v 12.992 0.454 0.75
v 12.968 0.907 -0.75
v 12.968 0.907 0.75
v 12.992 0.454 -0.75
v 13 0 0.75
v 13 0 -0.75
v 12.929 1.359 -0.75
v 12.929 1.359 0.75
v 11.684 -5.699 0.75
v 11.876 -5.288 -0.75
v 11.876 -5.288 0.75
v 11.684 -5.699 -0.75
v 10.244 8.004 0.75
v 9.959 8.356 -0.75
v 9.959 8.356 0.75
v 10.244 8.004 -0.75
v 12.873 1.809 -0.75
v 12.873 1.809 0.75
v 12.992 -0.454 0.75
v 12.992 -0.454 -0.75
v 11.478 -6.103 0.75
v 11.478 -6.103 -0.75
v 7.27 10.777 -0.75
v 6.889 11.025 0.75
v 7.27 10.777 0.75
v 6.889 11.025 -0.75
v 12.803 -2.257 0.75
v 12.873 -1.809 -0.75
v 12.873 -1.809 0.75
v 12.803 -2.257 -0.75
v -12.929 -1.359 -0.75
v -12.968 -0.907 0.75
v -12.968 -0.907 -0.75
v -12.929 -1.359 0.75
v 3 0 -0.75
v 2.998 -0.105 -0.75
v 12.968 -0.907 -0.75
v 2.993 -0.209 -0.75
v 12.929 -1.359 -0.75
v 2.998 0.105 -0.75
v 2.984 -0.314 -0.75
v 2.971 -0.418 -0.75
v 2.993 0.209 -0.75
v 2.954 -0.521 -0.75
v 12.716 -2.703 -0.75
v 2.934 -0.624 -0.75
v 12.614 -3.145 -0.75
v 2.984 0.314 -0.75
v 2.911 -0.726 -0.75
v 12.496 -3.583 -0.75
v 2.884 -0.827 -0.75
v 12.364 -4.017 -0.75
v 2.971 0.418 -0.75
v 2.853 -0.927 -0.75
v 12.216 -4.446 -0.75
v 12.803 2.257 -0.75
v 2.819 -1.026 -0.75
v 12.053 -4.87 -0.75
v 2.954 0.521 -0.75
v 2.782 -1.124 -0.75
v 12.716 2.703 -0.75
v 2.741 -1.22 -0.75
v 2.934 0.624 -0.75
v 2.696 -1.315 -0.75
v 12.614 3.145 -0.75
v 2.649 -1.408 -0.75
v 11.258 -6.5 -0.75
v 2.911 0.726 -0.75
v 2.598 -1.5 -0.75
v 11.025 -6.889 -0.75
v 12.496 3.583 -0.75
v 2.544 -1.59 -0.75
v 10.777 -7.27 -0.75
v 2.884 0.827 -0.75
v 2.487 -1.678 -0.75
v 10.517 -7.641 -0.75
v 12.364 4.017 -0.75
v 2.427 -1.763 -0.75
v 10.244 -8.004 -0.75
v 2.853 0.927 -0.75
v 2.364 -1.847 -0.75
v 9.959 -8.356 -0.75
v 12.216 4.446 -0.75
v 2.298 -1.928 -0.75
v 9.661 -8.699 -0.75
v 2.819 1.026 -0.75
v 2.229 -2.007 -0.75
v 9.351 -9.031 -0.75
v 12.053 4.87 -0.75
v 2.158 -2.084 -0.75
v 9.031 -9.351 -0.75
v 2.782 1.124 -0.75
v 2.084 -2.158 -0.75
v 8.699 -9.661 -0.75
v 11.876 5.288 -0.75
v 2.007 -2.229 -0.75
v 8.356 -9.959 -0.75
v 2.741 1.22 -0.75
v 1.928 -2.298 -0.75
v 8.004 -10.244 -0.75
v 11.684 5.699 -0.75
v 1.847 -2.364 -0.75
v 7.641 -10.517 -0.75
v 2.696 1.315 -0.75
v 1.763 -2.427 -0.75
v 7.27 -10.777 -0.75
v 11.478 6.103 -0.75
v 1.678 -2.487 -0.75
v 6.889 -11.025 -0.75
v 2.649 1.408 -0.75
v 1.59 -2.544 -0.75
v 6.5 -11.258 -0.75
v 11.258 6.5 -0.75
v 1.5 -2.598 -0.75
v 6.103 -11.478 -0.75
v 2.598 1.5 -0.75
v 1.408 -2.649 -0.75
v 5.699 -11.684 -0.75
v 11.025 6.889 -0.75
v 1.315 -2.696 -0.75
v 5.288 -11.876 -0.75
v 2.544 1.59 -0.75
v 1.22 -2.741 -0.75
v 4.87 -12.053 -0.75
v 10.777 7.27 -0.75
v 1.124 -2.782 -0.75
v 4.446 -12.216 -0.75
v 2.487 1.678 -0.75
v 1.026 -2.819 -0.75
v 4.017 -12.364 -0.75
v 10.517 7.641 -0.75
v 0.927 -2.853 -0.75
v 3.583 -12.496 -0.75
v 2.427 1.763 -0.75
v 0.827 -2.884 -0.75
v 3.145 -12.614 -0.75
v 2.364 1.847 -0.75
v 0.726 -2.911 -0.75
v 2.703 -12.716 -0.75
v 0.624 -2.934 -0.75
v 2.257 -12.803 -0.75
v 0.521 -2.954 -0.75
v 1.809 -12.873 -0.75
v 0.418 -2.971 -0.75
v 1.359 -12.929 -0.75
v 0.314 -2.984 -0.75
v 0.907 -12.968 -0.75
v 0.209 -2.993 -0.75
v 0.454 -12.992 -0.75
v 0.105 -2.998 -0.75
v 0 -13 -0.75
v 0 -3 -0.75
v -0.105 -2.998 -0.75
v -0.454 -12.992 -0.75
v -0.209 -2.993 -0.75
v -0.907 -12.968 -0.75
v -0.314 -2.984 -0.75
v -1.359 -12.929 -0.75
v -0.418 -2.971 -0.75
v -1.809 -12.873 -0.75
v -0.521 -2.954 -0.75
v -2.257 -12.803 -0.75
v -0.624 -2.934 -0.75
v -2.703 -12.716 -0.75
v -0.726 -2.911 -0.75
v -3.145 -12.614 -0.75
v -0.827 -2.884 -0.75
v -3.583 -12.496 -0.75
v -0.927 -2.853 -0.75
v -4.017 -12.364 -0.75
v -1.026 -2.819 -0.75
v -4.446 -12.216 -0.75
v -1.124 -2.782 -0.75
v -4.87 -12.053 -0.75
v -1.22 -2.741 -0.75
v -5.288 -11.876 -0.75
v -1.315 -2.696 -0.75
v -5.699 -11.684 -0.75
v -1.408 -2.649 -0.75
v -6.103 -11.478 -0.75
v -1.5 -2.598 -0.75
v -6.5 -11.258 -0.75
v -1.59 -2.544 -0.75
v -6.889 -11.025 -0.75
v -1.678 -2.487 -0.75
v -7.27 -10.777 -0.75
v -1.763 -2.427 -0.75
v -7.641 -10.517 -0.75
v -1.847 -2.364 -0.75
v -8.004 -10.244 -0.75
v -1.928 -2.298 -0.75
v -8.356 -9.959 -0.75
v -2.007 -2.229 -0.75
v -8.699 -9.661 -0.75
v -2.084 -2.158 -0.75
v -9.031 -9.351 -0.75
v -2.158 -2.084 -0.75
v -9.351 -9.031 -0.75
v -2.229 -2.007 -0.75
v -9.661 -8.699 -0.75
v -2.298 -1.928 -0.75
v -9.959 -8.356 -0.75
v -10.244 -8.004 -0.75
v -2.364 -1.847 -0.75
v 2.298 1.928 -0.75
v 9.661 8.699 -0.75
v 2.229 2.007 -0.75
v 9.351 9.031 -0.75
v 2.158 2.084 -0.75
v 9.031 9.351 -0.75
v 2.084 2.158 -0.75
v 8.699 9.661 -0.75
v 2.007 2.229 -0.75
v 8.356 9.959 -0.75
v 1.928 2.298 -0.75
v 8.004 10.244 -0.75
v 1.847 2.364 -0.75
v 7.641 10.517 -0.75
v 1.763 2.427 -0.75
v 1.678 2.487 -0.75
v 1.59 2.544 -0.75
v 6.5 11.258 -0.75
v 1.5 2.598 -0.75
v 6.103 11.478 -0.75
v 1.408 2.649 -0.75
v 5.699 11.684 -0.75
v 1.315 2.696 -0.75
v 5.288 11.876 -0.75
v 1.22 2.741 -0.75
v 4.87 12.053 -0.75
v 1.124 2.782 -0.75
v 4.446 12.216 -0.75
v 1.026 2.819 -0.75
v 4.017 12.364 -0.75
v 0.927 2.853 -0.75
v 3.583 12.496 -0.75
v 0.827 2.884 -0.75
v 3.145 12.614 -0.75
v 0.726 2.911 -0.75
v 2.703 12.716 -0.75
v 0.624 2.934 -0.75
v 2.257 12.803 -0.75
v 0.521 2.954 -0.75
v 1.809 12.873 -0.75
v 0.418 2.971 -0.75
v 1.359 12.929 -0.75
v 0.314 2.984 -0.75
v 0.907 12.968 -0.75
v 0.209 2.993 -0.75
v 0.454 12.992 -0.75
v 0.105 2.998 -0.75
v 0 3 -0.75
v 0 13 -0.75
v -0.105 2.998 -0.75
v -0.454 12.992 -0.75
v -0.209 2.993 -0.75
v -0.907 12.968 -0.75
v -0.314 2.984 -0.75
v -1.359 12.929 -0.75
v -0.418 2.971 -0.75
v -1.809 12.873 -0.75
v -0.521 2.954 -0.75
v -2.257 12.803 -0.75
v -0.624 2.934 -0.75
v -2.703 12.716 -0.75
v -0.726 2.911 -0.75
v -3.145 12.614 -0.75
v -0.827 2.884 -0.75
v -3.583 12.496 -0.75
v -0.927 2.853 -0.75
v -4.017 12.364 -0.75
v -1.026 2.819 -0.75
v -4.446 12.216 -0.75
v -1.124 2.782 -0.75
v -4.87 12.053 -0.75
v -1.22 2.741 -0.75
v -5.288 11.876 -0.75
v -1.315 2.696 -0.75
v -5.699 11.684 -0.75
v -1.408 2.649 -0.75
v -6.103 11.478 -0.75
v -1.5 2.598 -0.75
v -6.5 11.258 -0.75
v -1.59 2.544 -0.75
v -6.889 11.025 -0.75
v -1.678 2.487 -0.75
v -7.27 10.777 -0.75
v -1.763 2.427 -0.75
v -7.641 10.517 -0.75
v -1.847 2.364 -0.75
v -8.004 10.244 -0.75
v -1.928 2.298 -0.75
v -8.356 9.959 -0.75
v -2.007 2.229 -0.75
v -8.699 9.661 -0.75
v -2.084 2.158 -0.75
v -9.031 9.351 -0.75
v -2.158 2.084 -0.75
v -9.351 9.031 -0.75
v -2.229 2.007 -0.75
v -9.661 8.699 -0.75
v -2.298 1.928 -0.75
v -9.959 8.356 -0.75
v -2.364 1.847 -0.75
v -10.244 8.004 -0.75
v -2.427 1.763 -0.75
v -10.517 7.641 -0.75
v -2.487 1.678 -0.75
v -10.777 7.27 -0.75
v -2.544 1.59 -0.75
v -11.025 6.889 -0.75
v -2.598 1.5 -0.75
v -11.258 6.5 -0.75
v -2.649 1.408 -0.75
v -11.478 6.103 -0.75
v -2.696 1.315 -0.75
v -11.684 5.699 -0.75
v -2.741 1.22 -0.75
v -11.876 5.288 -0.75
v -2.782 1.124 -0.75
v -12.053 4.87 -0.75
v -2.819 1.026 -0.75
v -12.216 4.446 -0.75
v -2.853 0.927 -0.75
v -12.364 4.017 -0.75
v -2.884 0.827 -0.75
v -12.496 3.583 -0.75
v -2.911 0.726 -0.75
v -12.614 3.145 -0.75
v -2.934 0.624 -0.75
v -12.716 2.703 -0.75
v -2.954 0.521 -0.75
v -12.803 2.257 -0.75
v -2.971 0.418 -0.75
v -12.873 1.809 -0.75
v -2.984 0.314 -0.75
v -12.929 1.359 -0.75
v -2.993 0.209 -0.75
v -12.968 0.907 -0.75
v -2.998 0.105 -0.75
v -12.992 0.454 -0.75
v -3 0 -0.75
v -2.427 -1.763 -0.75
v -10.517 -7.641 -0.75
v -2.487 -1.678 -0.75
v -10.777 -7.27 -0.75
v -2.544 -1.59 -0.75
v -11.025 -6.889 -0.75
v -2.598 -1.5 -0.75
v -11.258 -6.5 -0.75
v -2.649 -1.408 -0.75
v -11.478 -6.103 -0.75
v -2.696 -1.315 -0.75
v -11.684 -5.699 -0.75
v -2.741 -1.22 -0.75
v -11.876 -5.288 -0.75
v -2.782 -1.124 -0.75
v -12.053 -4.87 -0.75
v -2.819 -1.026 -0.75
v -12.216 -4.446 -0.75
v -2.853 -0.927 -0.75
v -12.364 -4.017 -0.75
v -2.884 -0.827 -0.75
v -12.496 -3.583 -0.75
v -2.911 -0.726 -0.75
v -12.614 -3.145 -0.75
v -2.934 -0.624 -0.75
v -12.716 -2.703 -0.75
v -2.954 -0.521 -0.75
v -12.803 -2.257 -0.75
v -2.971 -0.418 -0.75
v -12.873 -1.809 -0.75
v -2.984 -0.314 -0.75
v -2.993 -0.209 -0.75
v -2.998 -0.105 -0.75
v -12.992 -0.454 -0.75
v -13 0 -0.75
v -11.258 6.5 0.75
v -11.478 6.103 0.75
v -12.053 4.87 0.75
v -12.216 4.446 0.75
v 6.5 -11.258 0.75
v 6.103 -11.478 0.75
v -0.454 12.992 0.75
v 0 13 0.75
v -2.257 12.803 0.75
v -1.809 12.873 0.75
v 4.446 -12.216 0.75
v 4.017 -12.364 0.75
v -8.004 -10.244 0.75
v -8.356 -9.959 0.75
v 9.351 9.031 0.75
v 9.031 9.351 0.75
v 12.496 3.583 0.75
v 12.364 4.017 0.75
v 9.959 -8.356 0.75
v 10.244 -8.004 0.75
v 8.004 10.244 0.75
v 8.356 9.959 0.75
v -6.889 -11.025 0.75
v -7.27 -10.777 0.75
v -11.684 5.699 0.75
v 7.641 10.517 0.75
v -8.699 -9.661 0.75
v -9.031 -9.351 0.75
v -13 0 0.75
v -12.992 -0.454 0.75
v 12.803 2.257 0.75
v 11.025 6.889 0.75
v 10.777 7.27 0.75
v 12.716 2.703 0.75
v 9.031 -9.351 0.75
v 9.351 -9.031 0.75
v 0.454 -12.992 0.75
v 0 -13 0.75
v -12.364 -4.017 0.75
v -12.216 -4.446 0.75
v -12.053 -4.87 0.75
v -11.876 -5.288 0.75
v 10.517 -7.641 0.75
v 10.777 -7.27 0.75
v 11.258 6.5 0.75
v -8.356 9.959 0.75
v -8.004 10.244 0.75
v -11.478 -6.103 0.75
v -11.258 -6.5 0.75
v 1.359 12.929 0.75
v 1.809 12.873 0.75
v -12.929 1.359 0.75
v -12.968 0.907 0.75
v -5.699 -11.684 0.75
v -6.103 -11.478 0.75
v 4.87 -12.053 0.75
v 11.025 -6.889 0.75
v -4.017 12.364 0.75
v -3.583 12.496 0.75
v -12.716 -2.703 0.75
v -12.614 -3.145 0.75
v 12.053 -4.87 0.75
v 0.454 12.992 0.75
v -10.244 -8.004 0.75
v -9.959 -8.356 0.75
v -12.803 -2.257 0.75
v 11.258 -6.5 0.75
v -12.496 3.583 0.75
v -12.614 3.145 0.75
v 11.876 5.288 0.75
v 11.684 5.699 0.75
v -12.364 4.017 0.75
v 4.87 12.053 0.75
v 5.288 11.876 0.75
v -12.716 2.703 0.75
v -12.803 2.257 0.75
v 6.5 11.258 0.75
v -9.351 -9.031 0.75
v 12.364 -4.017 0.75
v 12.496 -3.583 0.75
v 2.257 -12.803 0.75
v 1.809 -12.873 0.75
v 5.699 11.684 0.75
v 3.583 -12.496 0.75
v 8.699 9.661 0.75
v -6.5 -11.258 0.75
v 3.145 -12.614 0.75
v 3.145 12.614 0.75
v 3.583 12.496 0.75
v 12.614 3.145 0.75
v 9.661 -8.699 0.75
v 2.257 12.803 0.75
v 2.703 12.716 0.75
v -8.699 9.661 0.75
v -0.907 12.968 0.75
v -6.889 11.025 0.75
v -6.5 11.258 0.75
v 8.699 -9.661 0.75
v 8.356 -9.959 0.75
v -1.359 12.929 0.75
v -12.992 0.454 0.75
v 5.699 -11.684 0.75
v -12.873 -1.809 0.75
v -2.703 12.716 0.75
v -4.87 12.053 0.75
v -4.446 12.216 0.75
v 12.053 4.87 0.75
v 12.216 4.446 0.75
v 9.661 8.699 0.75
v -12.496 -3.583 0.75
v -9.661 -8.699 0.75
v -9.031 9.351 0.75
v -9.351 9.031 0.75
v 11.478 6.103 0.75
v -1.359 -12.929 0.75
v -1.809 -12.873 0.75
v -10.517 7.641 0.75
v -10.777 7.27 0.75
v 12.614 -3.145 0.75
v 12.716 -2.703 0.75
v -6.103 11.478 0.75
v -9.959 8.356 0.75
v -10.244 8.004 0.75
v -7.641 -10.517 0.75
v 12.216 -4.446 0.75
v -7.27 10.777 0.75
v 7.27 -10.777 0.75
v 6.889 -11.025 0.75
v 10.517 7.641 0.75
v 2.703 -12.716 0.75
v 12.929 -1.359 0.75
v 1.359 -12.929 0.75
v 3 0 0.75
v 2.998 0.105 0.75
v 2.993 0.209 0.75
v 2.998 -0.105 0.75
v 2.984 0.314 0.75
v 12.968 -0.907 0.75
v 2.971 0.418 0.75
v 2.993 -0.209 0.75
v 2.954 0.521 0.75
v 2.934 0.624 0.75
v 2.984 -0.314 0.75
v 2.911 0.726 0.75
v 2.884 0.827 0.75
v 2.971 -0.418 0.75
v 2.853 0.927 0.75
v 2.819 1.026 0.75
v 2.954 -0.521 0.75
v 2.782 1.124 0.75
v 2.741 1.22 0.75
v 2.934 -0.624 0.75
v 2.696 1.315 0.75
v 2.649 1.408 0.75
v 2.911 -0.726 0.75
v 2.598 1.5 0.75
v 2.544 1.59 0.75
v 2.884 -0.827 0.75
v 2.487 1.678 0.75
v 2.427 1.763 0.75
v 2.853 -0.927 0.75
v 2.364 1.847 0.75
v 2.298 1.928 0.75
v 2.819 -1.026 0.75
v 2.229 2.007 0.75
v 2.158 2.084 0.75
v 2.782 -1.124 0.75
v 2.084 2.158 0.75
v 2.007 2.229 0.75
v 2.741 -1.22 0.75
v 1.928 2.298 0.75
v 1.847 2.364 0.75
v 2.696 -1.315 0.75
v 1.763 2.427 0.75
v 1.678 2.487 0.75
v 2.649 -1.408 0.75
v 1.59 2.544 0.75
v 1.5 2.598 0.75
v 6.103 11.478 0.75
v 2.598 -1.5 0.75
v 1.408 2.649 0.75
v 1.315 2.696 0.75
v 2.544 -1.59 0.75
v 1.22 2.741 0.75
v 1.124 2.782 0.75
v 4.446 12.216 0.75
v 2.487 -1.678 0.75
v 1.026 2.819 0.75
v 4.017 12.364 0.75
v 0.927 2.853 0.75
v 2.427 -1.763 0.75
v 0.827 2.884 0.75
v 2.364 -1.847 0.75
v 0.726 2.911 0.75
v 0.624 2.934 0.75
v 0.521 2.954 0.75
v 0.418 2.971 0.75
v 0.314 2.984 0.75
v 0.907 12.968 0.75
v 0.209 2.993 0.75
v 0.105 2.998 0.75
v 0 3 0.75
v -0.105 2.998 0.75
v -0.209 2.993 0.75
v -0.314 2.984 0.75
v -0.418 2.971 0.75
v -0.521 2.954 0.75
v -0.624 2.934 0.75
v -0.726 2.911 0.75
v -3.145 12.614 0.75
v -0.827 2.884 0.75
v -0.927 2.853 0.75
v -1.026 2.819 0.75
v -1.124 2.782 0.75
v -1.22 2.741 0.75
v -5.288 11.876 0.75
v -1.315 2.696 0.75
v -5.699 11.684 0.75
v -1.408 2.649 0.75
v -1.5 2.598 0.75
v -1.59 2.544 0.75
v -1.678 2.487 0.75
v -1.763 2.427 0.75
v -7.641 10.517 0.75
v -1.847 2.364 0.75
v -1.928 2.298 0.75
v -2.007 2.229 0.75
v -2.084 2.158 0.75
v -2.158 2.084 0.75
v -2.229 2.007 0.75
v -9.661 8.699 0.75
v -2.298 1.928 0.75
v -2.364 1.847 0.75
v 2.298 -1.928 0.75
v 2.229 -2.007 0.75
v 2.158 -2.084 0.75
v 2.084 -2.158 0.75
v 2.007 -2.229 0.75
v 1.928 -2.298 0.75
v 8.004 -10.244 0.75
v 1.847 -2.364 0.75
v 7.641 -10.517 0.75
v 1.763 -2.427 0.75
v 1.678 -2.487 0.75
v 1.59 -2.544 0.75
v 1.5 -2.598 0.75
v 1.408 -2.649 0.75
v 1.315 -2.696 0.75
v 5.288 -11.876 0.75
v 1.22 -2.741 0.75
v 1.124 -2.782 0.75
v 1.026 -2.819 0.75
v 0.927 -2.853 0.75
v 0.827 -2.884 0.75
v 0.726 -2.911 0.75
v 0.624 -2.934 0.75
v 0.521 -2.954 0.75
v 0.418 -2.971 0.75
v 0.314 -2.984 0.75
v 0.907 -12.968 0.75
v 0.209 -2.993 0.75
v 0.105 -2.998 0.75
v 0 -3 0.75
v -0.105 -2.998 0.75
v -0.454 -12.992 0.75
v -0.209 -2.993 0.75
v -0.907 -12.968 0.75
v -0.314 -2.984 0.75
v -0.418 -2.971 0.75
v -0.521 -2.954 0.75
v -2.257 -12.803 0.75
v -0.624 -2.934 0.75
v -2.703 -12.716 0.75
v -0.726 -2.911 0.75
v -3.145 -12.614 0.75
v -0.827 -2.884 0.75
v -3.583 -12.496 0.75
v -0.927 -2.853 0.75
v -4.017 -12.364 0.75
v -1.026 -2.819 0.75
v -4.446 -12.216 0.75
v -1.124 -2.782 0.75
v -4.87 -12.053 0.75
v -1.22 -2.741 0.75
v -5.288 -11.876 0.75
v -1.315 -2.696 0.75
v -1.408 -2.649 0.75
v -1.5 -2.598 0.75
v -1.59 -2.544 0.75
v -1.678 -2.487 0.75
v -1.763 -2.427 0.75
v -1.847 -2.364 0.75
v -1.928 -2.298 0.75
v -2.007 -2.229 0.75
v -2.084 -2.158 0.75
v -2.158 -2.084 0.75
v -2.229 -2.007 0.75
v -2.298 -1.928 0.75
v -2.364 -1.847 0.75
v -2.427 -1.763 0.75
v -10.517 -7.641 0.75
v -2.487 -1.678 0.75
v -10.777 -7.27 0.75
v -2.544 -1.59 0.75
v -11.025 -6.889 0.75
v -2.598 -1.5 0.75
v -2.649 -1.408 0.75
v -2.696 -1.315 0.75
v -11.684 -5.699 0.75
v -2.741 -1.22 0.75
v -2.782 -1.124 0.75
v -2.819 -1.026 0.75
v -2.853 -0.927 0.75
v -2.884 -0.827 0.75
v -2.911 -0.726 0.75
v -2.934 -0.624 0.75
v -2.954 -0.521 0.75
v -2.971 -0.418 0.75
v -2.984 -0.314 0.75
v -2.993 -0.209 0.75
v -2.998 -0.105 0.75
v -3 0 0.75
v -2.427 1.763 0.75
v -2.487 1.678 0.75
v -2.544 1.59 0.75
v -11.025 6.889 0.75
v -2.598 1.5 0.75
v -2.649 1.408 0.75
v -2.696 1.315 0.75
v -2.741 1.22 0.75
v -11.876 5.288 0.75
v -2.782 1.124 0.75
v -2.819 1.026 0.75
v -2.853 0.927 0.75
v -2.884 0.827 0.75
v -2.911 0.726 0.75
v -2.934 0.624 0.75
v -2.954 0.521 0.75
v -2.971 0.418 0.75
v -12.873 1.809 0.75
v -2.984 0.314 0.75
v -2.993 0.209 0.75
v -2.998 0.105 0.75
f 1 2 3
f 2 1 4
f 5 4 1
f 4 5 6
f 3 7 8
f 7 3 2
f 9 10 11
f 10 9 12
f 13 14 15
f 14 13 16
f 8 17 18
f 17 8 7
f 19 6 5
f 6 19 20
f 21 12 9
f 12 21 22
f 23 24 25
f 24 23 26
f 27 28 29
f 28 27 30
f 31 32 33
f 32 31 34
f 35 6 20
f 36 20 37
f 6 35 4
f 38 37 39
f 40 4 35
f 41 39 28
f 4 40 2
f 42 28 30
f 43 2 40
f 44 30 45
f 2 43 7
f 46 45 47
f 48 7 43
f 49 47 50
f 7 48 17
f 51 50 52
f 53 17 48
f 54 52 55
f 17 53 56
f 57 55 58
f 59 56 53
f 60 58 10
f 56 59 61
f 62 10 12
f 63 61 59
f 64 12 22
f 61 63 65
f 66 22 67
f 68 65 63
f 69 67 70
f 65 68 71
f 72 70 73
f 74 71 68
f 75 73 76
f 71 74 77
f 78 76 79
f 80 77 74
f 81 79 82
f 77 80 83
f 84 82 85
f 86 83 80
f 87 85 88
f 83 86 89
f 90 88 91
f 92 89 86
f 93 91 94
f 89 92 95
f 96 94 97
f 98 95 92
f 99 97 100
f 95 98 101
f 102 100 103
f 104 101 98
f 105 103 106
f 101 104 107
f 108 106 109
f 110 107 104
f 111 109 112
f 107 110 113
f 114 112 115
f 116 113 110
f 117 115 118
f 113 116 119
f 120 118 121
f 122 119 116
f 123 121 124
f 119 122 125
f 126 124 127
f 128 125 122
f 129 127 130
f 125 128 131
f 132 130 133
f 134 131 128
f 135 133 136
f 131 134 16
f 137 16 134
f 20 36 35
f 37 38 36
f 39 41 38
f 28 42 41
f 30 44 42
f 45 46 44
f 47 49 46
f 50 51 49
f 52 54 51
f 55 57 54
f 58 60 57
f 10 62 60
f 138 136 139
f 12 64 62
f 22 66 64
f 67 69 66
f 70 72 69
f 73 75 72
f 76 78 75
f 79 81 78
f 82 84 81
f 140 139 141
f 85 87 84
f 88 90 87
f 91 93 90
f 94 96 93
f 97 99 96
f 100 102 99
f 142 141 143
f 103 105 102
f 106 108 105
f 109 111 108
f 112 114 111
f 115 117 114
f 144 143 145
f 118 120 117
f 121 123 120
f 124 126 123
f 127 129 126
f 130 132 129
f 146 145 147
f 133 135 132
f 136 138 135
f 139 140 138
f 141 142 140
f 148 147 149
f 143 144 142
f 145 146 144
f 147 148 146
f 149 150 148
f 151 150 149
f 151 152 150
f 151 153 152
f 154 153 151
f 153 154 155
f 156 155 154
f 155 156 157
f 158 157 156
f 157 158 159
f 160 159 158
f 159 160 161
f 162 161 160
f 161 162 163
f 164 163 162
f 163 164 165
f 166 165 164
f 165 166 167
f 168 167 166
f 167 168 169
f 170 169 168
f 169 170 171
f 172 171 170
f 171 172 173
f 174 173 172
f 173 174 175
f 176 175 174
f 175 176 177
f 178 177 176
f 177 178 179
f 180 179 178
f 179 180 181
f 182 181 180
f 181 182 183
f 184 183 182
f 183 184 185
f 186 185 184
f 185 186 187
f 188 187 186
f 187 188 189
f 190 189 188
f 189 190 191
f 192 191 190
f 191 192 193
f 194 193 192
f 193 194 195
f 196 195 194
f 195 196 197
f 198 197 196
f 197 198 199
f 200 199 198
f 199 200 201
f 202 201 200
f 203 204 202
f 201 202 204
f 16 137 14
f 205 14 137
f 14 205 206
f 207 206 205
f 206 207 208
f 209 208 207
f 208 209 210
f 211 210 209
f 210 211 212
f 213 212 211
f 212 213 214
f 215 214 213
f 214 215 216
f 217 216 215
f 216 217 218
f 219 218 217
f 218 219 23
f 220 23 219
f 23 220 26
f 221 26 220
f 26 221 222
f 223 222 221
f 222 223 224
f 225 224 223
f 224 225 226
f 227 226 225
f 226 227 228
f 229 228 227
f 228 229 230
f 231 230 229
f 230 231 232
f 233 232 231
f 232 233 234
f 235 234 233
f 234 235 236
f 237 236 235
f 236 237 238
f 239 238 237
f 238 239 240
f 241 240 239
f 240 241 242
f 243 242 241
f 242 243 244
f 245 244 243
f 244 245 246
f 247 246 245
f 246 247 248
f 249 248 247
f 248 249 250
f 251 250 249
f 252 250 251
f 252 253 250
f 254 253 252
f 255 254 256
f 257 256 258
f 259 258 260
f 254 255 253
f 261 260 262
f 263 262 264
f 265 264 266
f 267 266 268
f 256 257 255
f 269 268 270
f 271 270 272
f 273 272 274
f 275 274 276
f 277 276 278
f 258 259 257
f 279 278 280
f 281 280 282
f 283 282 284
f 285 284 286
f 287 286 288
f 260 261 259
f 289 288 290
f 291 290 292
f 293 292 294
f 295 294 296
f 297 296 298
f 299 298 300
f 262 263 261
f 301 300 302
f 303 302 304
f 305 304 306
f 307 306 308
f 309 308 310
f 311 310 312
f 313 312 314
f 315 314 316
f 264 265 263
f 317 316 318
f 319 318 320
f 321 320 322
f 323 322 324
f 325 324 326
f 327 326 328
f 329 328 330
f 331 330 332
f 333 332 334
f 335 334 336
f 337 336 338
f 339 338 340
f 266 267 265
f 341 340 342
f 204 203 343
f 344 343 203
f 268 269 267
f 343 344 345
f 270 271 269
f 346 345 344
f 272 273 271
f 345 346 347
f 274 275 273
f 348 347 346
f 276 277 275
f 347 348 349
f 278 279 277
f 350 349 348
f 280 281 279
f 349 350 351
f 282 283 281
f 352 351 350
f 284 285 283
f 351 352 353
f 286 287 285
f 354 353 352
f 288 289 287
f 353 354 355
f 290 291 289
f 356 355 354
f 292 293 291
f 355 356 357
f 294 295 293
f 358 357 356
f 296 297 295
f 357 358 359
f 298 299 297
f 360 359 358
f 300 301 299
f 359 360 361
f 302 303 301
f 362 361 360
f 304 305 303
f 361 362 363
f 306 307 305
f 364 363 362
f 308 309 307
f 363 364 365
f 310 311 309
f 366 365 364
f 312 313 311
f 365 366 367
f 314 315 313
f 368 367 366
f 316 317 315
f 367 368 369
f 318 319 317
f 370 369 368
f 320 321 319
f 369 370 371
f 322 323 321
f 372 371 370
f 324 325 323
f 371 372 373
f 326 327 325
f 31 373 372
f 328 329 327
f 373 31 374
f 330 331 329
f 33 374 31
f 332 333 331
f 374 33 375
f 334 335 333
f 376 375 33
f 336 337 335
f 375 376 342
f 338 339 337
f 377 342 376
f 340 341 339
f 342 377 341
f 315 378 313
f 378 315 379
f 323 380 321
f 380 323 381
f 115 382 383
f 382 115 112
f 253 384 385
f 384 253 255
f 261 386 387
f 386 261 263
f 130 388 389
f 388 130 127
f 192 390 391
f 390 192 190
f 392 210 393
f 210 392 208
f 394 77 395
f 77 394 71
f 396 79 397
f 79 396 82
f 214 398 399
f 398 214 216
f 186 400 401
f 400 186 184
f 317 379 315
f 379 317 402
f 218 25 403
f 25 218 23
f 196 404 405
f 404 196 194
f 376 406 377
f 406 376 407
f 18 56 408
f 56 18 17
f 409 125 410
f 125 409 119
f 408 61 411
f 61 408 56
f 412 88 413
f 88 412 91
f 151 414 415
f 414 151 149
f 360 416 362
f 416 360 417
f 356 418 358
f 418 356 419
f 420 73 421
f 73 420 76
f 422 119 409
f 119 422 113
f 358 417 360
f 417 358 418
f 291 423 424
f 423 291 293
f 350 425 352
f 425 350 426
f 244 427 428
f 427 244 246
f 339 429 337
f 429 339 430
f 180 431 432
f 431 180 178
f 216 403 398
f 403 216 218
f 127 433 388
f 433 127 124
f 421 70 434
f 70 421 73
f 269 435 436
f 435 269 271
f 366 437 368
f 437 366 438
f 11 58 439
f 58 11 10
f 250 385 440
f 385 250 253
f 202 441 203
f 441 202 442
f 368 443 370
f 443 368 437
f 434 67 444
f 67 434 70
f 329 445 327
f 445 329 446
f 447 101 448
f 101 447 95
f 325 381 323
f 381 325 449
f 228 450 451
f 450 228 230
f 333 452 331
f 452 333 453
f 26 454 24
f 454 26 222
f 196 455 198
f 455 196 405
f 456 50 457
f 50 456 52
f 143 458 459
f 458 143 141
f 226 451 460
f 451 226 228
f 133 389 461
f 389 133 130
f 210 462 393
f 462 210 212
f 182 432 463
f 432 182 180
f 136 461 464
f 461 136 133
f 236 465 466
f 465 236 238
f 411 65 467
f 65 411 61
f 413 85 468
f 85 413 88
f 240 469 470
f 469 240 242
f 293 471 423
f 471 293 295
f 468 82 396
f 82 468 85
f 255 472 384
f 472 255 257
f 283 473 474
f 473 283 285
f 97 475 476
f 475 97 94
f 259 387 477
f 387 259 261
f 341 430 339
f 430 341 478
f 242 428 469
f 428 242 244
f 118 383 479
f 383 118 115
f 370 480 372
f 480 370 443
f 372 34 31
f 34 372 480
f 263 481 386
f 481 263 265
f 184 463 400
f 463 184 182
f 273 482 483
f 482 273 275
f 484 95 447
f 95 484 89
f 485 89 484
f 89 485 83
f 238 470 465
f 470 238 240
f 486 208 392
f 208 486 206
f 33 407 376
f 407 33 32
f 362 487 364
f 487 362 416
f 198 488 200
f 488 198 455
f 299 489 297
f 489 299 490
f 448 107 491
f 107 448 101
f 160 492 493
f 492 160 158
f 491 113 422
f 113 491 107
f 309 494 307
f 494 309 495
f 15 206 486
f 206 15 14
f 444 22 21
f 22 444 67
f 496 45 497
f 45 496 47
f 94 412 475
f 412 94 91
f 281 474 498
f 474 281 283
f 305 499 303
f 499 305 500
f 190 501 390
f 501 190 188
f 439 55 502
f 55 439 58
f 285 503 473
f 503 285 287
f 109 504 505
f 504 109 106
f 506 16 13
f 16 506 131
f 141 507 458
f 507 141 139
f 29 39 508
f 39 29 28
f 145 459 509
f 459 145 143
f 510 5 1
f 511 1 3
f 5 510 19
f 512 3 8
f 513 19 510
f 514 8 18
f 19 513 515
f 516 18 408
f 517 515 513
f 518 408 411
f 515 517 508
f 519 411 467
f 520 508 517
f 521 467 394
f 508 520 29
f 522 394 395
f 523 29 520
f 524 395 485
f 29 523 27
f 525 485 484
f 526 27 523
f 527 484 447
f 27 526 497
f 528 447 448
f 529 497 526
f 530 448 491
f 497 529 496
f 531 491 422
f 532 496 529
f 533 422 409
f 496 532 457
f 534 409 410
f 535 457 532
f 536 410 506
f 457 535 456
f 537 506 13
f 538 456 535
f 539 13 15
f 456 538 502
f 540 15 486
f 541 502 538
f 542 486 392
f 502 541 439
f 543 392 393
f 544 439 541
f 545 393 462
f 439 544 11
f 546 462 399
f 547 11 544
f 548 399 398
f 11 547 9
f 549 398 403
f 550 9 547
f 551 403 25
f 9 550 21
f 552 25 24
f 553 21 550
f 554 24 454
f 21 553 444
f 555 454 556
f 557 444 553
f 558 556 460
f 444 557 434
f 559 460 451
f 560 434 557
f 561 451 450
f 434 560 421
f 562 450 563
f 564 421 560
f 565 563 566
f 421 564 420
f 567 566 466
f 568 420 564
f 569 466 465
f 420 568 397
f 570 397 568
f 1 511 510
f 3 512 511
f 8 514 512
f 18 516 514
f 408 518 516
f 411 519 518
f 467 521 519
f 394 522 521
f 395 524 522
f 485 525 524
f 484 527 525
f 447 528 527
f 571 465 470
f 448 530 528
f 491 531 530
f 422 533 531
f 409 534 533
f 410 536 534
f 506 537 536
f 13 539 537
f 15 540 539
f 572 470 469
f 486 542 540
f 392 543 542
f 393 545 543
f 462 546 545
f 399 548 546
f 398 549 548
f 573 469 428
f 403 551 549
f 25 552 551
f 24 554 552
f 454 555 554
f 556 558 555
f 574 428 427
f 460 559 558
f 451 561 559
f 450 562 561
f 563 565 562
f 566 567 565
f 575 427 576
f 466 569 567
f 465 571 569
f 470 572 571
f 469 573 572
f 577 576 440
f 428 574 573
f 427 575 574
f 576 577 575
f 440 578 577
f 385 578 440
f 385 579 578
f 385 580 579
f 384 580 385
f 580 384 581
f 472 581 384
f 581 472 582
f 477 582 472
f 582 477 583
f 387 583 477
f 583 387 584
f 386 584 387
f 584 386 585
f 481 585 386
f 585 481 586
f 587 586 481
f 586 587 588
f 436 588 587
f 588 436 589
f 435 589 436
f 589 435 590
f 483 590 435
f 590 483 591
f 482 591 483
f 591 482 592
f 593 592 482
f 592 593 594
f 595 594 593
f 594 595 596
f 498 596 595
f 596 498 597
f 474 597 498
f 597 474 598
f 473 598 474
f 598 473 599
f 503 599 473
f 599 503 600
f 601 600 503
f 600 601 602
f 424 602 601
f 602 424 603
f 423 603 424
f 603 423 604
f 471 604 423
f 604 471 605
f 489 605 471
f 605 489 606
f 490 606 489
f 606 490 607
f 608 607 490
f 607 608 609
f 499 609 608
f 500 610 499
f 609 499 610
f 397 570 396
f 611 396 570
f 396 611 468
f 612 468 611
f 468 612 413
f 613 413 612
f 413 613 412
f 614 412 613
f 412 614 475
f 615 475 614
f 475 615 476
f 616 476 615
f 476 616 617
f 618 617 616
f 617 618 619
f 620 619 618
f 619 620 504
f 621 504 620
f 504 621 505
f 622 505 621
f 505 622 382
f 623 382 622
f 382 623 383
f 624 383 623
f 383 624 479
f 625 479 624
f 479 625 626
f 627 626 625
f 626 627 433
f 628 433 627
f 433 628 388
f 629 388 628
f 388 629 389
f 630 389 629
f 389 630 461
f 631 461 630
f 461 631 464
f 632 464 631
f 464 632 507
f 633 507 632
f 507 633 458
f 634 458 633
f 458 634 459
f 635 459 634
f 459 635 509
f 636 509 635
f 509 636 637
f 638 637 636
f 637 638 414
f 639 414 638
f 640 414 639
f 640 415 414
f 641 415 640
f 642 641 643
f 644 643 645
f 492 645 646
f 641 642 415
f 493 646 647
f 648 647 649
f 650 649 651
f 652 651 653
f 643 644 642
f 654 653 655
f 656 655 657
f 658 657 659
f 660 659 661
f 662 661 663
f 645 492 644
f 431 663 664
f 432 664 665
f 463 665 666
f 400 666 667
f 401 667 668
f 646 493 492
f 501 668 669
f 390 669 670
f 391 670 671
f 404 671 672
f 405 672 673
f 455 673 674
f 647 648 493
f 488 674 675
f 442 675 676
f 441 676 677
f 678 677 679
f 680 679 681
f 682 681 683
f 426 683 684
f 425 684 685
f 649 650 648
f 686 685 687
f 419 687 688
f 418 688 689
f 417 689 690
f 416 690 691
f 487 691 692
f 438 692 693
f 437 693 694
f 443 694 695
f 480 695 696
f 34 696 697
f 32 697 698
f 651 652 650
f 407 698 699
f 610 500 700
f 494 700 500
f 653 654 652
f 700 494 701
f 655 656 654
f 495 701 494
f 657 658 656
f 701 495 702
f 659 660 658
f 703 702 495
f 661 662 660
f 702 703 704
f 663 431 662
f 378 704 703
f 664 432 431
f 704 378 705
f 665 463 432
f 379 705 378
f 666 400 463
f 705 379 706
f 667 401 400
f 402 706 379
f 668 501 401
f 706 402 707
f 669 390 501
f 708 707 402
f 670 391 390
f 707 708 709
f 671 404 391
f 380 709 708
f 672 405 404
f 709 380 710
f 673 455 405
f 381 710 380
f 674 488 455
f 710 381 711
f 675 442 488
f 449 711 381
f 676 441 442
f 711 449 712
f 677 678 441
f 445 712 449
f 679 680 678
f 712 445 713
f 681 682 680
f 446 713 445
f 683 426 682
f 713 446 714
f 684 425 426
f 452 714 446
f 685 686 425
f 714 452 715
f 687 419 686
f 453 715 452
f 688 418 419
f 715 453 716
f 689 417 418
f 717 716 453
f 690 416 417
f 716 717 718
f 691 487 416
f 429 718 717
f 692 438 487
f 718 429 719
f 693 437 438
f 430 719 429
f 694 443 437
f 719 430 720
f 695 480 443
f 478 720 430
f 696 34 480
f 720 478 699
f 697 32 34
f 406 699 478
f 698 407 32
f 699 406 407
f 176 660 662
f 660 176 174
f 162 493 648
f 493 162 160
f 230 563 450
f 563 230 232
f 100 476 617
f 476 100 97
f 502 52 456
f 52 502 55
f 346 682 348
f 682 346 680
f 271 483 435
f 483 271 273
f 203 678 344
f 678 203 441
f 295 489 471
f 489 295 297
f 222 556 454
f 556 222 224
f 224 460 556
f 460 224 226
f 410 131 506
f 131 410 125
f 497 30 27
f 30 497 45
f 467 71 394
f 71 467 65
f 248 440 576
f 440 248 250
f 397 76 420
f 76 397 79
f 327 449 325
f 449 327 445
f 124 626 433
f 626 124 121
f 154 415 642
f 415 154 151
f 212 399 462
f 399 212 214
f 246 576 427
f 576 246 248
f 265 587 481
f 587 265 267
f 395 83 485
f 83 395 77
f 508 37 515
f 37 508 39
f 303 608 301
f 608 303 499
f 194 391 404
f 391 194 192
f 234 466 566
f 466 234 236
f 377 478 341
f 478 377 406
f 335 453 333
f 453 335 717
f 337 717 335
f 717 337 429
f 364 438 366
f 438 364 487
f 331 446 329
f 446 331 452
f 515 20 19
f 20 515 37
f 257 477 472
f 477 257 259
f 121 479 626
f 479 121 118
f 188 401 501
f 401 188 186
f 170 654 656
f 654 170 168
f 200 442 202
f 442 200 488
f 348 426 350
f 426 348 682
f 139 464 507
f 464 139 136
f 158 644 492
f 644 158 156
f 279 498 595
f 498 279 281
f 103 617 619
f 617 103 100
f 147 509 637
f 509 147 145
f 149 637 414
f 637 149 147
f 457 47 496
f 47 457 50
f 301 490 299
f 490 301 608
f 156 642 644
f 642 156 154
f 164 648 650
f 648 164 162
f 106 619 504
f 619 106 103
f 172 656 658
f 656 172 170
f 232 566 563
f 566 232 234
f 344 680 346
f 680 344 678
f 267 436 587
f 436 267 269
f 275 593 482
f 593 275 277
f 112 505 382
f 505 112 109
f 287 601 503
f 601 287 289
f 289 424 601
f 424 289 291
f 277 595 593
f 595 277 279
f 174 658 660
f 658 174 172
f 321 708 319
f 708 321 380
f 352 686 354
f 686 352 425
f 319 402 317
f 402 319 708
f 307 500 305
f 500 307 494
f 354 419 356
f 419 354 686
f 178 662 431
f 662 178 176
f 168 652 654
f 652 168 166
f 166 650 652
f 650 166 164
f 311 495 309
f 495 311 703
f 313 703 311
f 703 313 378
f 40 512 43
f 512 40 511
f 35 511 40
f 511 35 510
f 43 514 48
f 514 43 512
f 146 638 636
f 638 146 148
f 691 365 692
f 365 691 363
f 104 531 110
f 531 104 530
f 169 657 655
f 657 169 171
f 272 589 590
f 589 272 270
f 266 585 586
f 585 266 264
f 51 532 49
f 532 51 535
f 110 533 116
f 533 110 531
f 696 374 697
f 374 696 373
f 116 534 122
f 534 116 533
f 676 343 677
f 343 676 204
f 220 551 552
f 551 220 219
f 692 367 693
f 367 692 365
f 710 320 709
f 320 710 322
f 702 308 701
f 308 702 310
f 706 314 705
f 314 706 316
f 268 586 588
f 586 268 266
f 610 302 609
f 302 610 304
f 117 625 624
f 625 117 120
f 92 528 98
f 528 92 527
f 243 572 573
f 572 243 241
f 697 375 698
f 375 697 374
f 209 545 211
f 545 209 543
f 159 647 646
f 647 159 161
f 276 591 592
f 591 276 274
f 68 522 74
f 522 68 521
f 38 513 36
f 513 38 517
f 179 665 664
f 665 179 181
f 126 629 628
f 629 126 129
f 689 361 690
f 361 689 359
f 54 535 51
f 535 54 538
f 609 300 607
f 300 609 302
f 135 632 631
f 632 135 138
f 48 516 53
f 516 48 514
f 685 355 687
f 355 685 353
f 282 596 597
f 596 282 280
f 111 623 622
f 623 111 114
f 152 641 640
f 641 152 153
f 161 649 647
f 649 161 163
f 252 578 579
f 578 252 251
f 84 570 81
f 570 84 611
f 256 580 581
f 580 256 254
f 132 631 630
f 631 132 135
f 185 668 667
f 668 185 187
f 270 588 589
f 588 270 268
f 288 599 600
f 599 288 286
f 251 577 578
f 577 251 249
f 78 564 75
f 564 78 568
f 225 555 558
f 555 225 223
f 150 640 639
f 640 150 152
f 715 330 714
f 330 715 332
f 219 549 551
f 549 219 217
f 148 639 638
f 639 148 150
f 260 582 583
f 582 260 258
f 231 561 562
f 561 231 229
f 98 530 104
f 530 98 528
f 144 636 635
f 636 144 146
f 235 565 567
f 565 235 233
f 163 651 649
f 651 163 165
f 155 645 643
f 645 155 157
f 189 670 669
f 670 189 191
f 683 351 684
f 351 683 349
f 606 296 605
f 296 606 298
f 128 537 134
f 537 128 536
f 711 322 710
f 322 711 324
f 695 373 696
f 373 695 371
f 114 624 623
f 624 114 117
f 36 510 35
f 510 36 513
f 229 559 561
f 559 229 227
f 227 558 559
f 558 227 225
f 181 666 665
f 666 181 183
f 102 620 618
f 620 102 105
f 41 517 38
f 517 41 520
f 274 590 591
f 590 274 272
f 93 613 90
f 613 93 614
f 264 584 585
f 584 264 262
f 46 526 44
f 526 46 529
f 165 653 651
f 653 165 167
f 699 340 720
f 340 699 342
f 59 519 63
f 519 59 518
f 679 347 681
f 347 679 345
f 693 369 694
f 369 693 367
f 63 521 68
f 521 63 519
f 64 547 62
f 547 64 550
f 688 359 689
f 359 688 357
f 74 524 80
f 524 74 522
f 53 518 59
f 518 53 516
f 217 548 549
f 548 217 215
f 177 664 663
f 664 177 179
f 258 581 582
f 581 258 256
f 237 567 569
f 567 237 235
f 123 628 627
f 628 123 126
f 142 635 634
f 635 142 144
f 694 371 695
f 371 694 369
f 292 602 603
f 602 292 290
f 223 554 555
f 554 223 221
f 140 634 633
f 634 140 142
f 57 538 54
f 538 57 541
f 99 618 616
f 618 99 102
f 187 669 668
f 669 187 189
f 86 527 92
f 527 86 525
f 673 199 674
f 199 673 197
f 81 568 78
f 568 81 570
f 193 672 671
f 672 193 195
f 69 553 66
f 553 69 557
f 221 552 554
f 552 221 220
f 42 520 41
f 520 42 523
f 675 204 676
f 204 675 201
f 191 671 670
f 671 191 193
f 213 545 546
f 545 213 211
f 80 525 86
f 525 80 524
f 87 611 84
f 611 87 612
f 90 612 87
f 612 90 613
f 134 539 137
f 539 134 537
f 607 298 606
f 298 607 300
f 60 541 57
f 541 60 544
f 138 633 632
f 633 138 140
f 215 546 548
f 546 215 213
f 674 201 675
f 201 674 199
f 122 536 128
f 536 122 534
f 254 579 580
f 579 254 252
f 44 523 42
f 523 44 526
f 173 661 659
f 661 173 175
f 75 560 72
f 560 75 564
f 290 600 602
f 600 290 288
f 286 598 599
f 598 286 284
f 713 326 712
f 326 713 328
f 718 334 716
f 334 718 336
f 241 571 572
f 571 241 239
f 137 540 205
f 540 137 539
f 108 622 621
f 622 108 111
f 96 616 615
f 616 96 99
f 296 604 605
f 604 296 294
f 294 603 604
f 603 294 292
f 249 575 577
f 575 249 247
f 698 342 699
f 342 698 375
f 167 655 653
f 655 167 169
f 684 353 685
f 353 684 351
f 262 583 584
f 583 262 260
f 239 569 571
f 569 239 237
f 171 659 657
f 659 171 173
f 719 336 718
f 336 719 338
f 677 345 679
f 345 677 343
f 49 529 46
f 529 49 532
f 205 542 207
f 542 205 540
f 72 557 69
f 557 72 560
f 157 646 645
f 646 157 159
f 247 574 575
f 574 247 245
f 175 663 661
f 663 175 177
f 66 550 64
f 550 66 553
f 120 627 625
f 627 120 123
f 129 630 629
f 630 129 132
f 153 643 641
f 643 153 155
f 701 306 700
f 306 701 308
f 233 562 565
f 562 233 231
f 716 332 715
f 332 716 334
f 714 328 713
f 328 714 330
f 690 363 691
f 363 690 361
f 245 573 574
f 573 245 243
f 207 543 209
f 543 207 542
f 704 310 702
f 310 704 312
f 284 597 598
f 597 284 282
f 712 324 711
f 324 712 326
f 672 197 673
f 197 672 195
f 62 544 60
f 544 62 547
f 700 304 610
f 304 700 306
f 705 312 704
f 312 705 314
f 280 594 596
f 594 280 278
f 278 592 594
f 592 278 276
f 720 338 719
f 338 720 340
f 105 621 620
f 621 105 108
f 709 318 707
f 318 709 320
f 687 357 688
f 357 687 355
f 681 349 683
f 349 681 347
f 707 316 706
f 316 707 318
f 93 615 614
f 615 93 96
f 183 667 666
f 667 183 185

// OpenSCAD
$fn = 180;

// Target dimensions (mm)
outer_diameter = 26.0;
inner_diameter = 6.0;
thickness      = 1.5;

// Small extra height to guarantee clean subtraction
overlap = 0.2;

difference() {
    // Outer body
    cylinder(d = outer_diameter, h = thickness, center = true);

    // Through hole
    cylinder(d = inner_diameter, h = thickness + 2*overlap, center = true);
}
